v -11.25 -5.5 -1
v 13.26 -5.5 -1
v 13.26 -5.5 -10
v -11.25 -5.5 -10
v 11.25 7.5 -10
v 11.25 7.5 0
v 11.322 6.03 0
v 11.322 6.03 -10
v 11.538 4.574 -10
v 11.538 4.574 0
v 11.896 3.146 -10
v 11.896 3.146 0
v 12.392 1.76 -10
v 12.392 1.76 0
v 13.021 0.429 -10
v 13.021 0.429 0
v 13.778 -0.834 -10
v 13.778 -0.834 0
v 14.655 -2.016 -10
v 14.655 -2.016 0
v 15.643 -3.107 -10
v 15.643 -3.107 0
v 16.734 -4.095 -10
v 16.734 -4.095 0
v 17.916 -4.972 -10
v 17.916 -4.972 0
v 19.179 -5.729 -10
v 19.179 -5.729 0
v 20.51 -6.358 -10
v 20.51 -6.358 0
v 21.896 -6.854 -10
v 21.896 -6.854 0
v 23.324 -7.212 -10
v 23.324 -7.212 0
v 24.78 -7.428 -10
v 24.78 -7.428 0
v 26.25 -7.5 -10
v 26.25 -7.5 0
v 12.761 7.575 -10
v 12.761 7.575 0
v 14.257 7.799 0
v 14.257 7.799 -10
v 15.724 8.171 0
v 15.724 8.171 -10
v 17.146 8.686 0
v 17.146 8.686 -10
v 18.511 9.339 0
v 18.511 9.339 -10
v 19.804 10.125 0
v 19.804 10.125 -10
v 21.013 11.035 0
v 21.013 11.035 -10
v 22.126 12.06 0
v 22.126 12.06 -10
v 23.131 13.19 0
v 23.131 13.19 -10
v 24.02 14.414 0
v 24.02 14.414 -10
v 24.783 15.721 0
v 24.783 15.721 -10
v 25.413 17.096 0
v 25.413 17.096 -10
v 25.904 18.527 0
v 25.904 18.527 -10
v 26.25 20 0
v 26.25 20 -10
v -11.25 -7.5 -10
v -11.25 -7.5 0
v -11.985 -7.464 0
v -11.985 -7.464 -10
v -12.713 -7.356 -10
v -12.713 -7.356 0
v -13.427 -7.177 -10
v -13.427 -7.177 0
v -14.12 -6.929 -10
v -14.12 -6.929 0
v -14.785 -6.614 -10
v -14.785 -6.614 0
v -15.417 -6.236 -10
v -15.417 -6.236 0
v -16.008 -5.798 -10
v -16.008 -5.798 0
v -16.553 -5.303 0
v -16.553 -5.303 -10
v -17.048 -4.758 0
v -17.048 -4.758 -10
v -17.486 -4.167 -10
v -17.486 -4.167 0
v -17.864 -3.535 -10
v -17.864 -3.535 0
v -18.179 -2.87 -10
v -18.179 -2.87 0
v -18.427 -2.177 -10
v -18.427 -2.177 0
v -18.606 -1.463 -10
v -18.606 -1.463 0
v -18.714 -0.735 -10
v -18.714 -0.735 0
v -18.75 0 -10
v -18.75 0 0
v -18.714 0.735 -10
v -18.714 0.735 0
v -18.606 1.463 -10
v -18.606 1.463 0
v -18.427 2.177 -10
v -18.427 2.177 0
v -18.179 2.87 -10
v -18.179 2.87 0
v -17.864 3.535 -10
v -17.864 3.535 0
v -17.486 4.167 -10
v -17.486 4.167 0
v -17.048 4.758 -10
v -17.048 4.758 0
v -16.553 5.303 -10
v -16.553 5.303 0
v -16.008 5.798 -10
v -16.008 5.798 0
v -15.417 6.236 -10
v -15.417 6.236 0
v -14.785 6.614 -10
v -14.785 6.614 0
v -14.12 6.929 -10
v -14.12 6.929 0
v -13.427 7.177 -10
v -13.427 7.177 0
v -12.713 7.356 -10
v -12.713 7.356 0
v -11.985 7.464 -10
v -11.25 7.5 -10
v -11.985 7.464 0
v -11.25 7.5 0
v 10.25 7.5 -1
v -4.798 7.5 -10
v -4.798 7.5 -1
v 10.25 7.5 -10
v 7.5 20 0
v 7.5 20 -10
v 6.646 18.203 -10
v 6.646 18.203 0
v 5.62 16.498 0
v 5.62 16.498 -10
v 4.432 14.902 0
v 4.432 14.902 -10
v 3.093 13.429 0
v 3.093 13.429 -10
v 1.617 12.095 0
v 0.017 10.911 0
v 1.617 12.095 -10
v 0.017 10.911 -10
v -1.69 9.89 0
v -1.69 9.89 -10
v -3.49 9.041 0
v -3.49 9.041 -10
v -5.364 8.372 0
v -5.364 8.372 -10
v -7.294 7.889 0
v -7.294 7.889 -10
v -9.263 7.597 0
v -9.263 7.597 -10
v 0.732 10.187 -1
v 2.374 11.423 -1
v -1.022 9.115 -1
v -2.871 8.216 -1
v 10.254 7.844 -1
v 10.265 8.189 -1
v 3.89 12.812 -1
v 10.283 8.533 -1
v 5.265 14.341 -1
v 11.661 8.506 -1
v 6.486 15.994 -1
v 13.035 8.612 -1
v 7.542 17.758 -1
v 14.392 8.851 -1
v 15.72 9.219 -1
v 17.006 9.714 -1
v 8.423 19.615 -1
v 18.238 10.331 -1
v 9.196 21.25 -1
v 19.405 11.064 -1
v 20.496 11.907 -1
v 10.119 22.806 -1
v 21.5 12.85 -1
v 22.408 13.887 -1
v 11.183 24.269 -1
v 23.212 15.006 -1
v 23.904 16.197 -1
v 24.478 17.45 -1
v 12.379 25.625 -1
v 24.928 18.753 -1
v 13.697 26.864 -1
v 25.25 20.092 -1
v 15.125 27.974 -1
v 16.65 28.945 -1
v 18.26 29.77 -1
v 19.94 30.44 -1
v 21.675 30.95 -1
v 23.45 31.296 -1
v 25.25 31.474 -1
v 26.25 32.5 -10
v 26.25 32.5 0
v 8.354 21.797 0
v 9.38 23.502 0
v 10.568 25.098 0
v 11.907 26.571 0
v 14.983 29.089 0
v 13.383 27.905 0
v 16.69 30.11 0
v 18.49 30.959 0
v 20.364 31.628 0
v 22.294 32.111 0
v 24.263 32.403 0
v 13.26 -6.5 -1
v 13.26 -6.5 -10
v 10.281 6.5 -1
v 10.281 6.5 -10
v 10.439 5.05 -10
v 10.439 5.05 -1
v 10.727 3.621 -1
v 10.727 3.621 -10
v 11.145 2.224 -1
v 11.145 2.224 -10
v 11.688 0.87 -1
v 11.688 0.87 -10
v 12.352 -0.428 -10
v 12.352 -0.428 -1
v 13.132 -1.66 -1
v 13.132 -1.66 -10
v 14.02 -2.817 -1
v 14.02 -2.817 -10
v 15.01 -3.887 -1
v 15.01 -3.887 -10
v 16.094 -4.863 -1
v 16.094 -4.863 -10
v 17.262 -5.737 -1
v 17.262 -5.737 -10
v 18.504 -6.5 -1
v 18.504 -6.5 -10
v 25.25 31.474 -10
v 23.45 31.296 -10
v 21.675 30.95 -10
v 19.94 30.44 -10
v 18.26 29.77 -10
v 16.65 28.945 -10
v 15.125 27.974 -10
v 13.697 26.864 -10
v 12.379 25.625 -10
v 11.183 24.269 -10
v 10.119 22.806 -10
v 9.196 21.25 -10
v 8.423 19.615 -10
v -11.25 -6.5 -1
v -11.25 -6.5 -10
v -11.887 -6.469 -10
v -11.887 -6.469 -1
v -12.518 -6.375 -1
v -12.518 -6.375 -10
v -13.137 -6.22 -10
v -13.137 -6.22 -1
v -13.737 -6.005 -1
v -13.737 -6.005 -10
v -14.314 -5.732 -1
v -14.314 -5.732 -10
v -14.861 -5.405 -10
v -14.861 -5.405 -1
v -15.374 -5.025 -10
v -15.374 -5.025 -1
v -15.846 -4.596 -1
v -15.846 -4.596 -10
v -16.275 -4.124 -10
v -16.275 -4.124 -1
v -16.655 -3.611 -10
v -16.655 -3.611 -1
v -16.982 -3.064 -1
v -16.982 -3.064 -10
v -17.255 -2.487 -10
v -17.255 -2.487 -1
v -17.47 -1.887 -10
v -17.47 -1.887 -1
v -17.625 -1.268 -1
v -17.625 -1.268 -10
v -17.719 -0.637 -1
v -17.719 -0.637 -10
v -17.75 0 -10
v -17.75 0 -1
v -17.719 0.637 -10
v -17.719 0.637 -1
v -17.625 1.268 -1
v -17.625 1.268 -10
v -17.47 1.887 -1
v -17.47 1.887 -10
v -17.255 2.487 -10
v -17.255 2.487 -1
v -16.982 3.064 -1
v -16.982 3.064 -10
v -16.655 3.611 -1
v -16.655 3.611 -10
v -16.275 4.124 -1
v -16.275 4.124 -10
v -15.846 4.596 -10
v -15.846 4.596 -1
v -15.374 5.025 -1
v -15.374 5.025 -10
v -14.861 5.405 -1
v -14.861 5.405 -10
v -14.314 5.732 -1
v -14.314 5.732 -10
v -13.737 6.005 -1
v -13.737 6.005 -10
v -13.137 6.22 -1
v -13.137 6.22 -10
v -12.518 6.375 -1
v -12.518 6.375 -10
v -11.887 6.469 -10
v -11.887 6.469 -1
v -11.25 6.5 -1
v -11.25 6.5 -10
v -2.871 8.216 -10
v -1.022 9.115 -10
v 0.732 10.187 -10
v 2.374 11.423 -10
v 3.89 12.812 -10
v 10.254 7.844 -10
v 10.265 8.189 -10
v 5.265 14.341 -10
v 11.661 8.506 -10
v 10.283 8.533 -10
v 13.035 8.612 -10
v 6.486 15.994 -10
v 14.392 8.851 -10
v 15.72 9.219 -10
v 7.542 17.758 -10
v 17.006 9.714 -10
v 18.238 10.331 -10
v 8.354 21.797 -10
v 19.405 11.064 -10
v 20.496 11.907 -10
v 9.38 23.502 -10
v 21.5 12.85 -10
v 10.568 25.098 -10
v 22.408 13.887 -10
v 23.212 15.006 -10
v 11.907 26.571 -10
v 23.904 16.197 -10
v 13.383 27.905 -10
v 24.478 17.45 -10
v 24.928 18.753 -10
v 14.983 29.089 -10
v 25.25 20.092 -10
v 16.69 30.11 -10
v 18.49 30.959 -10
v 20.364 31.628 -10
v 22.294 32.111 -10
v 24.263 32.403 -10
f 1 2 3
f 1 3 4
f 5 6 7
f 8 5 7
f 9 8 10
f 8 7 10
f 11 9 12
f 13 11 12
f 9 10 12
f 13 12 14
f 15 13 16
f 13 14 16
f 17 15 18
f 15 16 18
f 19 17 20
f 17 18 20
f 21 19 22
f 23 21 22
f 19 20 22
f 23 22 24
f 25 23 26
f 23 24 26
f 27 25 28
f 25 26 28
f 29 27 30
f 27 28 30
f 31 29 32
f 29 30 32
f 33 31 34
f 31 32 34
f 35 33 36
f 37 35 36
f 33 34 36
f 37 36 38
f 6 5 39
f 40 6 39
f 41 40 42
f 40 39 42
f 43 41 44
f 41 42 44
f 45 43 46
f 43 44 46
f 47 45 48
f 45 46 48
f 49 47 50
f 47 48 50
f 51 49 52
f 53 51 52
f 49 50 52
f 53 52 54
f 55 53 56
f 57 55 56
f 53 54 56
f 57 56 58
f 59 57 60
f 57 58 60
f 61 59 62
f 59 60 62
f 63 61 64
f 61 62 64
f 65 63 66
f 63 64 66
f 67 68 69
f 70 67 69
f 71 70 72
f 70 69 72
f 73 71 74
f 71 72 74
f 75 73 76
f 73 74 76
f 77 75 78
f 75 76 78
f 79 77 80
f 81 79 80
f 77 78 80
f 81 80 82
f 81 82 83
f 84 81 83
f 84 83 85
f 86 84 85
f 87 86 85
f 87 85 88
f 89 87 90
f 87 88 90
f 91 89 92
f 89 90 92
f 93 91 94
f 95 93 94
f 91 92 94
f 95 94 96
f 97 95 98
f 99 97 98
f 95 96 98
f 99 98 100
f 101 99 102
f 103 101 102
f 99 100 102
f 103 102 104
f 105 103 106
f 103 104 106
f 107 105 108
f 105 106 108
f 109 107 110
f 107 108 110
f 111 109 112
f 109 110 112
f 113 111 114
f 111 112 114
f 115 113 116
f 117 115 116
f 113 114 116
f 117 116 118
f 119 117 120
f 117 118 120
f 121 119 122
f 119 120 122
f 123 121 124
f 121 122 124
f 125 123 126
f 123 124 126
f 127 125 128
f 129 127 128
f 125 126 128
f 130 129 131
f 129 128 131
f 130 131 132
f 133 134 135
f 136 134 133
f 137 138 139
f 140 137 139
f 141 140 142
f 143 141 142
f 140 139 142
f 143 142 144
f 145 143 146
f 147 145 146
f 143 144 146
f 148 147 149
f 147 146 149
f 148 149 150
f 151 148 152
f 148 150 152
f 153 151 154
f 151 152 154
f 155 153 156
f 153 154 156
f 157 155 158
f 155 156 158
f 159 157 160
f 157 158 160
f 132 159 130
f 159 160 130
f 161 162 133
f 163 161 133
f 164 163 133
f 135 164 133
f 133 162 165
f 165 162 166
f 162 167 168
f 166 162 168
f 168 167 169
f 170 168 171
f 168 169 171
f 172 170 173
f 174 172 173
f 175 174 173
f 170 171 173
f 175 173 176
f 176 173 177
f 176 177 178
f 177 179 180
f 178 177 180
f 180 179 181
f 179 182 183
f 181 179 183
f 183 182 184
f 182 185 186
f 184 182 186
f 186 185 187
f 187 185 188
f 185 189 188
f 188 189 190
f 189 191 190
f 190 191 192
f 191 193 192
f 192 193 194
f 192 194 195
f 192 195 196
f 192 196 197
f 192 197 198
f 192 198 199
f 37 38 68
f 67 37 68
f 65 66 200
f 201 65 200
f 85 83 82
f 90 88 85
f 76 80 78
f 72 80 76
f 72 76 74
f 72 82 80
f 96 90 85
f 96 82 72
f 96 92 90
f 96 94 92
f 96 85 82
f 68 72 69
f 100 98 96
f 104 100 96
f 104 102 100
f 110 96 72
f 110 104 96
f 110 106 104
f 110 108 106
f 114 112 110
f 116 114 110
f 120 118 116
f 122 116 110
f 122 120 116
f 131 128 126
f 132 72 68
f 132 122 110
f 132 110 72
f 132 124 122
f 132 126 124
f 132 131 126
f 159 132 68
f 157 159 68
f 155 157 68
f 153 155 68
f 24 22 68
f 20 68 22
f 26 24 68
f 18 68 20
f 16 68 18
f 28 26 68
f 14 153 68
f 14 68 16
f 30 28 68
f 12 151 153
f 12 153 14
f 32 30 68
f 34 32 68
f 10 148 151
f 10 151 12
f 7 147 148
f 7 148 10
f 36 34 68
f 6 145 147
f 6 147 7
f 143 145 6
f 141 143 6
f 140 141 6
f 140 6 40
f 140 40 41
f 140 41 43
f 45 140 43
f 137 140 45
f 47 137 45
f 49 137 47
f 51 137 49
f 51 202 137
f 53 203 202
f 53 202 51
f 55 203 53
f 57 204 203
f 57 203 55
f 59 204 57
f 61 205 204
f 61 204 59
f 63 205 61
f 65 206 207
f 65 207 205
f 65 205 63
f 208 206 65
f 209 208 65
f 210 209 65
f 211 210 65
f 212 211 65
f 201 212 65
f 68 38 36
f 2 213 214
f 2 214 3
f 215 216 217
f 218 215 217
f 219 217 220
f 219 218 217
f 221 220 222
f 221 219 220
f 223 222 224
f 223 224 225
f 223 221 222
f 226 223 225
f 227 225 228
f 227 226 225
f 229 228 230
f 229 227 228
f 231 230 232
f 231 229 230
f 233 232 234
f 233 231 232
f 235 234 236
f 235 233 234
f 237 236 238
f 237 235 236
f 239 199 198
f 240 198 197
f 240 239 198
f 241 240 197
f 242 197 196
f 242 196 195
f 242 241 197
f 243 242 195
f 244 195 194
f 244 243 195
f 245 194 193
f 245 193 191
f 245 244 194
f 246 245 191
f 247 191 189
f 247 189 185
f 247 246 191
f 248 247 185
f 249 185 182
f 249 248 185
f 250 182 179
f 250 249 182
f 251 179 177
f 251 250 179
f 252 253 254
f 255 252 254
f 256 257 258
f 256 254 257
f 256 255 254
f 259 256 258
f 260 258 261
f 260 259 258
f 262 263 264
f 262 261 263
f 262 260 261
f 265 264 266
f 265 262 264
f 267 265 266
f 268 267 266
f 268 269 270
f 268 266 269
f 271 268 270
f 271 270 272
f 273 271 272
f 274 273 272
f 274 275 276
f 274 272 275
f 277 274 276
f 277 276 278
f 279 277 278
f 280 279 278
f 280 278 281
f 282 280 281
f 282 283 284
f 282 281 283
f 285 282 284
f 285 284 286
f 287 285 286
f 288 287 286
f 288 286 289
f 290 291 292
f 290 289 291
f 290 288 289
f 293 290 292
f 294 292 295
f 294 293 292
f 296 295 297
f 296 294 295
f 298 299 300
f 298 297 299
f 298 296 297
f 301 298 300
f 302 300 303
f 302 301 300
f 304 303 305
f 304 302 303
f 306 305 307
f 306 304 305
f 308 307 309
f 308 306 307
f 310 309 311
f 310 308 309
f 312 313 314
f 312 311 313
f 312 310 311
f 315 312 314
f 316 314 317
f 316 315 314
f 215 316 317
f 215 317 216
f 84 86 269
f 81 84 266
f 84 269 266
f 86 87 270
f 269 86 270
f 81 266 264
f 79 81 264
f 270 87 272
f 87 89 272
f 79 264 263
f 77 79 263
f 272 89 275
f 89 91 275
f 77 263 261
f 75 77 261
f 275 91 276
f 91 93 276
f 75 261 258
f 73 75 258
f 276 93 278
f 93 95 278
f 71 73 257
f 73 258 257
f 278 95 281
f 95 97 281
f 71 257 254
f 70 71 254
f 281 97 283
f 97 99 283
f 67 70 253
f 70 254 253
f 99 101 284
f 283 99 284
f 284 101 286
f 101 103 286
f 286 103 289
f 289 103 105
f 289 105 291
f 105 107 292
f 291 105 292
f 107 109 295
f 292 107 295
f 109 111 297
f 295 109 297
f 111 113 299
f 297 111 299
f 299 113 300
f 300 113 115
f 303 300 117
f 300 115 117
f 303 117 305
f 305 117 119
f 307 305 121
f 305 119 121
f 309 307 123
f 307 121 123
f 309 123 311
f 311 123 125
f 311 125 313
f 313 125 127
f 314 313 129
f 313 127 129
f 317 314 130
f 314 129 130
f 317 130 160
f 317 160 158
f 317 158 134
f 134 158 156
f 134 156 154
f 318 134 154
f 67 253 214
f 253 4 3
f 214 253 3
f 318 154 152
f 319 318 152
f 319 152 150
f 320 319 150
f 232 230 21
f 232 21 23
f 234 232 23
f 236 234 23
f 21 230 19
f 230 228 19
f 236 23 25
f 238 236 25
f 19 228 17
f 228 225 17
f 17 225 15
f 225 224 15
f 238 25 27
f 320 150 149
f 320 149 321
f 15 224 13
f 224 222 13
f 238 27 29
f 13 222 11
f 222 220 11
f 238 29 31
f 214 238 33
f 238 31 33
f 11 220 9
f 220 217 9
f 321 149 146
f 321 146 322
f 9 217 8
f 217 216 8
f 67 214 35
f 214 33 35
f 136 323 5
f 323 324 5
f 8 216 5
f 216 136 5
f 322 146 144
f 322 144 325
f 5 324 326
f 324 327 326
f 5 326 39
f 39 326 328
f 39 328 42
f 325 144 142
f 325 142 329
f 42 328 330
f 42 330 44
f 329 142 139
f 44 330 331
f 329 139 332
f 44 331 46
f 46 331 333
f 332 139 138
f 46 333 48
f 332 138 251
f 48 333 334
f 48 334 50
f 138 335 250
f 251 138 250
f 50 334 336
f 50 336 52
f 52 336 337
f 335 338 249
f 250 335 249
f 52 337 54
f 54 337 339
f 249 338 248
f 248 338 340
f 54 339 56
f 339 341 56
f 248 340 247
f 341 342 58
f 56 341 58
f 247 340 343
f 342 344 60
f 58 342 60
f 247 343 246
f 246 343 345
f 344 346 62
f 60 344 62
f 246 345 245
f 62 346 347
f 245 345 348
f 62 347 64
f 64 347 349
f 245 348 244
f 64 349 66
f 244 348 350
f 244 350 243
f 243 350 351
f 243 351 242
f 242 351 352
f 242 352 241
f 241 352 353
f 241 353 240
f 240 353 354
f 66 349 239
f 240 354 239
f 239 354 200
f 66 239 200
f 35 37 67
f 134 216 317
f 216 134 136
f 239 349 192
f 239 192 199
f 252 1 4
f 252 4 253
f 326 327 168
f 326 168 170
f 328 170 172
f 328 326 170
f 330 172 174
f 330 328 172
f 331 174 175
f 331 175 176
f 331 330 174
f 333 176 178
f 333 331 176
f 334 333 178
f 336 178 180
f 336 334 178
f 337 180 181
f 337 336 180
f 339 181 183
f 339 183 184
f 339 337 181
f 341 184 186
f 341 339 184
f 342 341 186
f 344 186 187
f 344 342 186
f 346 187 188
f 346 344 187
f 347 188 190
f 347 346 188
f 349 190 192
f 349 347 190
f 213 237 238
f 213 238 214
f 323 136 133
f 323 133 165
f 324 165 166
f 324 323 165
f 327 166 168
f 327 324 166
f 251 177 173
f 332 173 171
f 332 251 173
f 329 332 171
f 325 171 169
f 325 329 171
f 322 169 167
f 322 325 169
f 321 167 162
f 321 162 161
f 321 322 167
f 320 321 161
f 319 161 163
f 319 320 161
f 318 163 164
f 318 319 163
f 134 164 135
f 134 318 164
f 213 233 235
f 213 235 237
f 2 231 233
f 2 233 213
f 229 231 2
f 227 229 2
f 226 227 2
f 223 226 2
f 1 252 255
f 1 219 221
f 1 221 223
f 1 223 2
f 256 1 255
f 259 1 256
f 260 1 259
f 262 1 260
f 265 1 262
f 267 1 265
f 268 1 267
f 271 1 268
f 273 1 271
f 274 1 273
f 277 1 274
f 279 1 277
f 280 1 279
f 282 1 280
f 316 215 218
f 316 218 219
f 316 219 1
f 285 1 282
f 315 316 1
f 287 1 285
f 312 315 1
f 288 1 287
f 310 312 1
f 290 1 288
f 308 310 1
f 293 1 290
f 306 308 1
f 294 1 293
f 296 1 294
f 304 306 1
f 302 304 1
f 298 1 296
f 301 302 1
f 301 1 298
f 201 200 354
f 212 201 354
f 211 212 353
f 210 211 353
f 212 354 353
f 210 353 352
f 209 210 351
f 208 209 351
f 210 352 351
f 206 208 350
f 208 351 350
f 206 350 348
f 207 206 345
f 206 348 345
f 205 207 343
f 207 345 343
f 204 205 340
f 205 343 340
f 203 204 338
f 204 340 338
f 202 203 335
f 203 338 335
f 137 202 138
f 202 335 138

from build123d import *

# Parameters (mm, degrees)
BOSS_EXTRUDE1_DEPTH = 10
SHELL1_T            = -1
BOSS_EXTRUDE2_DEPTH = 10
BOSS_EXTRUDE3_DEPTH = 10
SHELL3_START        = -10
SHELL3_DEPTH        = 9


# Read off the part's stored shape, not the designer's step: Shell3
with BuildPart() as part:
    # Sketch2 → Boss-Extrude1 (new body)
    with BuildSketch(Plane.XY):
        with BuildLine():
            Line((-11.25, 7.5), (11.25, 7.5))
            ThreePointArc((11.25, 7.5), (15.643398282, -3.106601718), (26.25, -7.5))
            Line((26.25, -7.5), (11.25, -7.5))
            Line((11.25, -7.5), (-11.25, -7.5))
            ThreePointArc((-11.25, -7.5), (-18.75, 0), (-11.25, 7.5))
        make_face()
    extrude(amount=-BOSS_EXTRUDE1_DEPTH)

    # Shell1
    shell1_openings = [part.faces().sort_by_distance(p)[0] for p in [
        (-1.202754878, -0.422571934, -10),
    ]]
    offset(amount=SHELL1_T, openings=shell1_openings, kind=Kind.INTERSECTION)

    # Sketch3 → Boss-Extrude2 (add)
    with BuildSketch(Plane.XY):
        Polygon((13.259618943, -5.5), (-11.25, -5.5), (-11.25, -6.5), (-11.25, -7.5), (13.259618943, -7.5), (13.259618943, -6.56903326), align=None)
    extrude(amount=-BOSS_EXTRUDE2_DEPTH)

    # Sketch6 → Boss-Extrude3 (add)
    with BuildSketch(Plane(origin=(0, 0, -10), x_dir=(-1, 0, 0), z_dir=(0, 0, -1))):
        with BuildLine():
            Line((-26.25, 20), (-26.25, 32.5))
            ThreePointArc((-26.25, 32.5), (-14.982652264, 29.088521604), (-7.5, 20))
            ThreePointArc((-7.5, 20), (-0.017347736, 10.911478396), (11.25, 7.5))
            Line((11.25, 7.5), (-11.25, 7.5))
            ThreePointArc((-11.25, 7.5), (-21.012812095, 11.034625486), (-26.25, 20))
        make_face()
    extrude(amount=-BOSS_EXTRUDE3_DEPTH)

    # Shell3 outline → Shell3 (cut)
    with BuildSketch(Plane.XY.offset(SHELL3_START)):
        with BuildLine():
            ThreePointArc((10.25, 7.5), (10.258344649, 8.016680893), (10.283369893, 8.532822846))
            ThreePointArc((10.283369893, 8.532822846), (19.960539936, 11.472190194), (25.25, 20.092463547))
            Line((25.25, 20.092463547), (25.25, 31.474092655))
            ThreePointArc((25.25, 31.474092655), (15.124781026, 27.973638192), (8.423076923, 19.615384615))
            ThreePointArc((8.423076923, 19.615384615), (3.148687527, 12.099433662), (-4.79825605, 7.5))
            Line((-4.79825605, 7.5), (10.25, 7.5))
        make_face()
    extrude(amount=SHELL3_DEPTH, mode=Mode.SUBTRACT)


solid = part.part
